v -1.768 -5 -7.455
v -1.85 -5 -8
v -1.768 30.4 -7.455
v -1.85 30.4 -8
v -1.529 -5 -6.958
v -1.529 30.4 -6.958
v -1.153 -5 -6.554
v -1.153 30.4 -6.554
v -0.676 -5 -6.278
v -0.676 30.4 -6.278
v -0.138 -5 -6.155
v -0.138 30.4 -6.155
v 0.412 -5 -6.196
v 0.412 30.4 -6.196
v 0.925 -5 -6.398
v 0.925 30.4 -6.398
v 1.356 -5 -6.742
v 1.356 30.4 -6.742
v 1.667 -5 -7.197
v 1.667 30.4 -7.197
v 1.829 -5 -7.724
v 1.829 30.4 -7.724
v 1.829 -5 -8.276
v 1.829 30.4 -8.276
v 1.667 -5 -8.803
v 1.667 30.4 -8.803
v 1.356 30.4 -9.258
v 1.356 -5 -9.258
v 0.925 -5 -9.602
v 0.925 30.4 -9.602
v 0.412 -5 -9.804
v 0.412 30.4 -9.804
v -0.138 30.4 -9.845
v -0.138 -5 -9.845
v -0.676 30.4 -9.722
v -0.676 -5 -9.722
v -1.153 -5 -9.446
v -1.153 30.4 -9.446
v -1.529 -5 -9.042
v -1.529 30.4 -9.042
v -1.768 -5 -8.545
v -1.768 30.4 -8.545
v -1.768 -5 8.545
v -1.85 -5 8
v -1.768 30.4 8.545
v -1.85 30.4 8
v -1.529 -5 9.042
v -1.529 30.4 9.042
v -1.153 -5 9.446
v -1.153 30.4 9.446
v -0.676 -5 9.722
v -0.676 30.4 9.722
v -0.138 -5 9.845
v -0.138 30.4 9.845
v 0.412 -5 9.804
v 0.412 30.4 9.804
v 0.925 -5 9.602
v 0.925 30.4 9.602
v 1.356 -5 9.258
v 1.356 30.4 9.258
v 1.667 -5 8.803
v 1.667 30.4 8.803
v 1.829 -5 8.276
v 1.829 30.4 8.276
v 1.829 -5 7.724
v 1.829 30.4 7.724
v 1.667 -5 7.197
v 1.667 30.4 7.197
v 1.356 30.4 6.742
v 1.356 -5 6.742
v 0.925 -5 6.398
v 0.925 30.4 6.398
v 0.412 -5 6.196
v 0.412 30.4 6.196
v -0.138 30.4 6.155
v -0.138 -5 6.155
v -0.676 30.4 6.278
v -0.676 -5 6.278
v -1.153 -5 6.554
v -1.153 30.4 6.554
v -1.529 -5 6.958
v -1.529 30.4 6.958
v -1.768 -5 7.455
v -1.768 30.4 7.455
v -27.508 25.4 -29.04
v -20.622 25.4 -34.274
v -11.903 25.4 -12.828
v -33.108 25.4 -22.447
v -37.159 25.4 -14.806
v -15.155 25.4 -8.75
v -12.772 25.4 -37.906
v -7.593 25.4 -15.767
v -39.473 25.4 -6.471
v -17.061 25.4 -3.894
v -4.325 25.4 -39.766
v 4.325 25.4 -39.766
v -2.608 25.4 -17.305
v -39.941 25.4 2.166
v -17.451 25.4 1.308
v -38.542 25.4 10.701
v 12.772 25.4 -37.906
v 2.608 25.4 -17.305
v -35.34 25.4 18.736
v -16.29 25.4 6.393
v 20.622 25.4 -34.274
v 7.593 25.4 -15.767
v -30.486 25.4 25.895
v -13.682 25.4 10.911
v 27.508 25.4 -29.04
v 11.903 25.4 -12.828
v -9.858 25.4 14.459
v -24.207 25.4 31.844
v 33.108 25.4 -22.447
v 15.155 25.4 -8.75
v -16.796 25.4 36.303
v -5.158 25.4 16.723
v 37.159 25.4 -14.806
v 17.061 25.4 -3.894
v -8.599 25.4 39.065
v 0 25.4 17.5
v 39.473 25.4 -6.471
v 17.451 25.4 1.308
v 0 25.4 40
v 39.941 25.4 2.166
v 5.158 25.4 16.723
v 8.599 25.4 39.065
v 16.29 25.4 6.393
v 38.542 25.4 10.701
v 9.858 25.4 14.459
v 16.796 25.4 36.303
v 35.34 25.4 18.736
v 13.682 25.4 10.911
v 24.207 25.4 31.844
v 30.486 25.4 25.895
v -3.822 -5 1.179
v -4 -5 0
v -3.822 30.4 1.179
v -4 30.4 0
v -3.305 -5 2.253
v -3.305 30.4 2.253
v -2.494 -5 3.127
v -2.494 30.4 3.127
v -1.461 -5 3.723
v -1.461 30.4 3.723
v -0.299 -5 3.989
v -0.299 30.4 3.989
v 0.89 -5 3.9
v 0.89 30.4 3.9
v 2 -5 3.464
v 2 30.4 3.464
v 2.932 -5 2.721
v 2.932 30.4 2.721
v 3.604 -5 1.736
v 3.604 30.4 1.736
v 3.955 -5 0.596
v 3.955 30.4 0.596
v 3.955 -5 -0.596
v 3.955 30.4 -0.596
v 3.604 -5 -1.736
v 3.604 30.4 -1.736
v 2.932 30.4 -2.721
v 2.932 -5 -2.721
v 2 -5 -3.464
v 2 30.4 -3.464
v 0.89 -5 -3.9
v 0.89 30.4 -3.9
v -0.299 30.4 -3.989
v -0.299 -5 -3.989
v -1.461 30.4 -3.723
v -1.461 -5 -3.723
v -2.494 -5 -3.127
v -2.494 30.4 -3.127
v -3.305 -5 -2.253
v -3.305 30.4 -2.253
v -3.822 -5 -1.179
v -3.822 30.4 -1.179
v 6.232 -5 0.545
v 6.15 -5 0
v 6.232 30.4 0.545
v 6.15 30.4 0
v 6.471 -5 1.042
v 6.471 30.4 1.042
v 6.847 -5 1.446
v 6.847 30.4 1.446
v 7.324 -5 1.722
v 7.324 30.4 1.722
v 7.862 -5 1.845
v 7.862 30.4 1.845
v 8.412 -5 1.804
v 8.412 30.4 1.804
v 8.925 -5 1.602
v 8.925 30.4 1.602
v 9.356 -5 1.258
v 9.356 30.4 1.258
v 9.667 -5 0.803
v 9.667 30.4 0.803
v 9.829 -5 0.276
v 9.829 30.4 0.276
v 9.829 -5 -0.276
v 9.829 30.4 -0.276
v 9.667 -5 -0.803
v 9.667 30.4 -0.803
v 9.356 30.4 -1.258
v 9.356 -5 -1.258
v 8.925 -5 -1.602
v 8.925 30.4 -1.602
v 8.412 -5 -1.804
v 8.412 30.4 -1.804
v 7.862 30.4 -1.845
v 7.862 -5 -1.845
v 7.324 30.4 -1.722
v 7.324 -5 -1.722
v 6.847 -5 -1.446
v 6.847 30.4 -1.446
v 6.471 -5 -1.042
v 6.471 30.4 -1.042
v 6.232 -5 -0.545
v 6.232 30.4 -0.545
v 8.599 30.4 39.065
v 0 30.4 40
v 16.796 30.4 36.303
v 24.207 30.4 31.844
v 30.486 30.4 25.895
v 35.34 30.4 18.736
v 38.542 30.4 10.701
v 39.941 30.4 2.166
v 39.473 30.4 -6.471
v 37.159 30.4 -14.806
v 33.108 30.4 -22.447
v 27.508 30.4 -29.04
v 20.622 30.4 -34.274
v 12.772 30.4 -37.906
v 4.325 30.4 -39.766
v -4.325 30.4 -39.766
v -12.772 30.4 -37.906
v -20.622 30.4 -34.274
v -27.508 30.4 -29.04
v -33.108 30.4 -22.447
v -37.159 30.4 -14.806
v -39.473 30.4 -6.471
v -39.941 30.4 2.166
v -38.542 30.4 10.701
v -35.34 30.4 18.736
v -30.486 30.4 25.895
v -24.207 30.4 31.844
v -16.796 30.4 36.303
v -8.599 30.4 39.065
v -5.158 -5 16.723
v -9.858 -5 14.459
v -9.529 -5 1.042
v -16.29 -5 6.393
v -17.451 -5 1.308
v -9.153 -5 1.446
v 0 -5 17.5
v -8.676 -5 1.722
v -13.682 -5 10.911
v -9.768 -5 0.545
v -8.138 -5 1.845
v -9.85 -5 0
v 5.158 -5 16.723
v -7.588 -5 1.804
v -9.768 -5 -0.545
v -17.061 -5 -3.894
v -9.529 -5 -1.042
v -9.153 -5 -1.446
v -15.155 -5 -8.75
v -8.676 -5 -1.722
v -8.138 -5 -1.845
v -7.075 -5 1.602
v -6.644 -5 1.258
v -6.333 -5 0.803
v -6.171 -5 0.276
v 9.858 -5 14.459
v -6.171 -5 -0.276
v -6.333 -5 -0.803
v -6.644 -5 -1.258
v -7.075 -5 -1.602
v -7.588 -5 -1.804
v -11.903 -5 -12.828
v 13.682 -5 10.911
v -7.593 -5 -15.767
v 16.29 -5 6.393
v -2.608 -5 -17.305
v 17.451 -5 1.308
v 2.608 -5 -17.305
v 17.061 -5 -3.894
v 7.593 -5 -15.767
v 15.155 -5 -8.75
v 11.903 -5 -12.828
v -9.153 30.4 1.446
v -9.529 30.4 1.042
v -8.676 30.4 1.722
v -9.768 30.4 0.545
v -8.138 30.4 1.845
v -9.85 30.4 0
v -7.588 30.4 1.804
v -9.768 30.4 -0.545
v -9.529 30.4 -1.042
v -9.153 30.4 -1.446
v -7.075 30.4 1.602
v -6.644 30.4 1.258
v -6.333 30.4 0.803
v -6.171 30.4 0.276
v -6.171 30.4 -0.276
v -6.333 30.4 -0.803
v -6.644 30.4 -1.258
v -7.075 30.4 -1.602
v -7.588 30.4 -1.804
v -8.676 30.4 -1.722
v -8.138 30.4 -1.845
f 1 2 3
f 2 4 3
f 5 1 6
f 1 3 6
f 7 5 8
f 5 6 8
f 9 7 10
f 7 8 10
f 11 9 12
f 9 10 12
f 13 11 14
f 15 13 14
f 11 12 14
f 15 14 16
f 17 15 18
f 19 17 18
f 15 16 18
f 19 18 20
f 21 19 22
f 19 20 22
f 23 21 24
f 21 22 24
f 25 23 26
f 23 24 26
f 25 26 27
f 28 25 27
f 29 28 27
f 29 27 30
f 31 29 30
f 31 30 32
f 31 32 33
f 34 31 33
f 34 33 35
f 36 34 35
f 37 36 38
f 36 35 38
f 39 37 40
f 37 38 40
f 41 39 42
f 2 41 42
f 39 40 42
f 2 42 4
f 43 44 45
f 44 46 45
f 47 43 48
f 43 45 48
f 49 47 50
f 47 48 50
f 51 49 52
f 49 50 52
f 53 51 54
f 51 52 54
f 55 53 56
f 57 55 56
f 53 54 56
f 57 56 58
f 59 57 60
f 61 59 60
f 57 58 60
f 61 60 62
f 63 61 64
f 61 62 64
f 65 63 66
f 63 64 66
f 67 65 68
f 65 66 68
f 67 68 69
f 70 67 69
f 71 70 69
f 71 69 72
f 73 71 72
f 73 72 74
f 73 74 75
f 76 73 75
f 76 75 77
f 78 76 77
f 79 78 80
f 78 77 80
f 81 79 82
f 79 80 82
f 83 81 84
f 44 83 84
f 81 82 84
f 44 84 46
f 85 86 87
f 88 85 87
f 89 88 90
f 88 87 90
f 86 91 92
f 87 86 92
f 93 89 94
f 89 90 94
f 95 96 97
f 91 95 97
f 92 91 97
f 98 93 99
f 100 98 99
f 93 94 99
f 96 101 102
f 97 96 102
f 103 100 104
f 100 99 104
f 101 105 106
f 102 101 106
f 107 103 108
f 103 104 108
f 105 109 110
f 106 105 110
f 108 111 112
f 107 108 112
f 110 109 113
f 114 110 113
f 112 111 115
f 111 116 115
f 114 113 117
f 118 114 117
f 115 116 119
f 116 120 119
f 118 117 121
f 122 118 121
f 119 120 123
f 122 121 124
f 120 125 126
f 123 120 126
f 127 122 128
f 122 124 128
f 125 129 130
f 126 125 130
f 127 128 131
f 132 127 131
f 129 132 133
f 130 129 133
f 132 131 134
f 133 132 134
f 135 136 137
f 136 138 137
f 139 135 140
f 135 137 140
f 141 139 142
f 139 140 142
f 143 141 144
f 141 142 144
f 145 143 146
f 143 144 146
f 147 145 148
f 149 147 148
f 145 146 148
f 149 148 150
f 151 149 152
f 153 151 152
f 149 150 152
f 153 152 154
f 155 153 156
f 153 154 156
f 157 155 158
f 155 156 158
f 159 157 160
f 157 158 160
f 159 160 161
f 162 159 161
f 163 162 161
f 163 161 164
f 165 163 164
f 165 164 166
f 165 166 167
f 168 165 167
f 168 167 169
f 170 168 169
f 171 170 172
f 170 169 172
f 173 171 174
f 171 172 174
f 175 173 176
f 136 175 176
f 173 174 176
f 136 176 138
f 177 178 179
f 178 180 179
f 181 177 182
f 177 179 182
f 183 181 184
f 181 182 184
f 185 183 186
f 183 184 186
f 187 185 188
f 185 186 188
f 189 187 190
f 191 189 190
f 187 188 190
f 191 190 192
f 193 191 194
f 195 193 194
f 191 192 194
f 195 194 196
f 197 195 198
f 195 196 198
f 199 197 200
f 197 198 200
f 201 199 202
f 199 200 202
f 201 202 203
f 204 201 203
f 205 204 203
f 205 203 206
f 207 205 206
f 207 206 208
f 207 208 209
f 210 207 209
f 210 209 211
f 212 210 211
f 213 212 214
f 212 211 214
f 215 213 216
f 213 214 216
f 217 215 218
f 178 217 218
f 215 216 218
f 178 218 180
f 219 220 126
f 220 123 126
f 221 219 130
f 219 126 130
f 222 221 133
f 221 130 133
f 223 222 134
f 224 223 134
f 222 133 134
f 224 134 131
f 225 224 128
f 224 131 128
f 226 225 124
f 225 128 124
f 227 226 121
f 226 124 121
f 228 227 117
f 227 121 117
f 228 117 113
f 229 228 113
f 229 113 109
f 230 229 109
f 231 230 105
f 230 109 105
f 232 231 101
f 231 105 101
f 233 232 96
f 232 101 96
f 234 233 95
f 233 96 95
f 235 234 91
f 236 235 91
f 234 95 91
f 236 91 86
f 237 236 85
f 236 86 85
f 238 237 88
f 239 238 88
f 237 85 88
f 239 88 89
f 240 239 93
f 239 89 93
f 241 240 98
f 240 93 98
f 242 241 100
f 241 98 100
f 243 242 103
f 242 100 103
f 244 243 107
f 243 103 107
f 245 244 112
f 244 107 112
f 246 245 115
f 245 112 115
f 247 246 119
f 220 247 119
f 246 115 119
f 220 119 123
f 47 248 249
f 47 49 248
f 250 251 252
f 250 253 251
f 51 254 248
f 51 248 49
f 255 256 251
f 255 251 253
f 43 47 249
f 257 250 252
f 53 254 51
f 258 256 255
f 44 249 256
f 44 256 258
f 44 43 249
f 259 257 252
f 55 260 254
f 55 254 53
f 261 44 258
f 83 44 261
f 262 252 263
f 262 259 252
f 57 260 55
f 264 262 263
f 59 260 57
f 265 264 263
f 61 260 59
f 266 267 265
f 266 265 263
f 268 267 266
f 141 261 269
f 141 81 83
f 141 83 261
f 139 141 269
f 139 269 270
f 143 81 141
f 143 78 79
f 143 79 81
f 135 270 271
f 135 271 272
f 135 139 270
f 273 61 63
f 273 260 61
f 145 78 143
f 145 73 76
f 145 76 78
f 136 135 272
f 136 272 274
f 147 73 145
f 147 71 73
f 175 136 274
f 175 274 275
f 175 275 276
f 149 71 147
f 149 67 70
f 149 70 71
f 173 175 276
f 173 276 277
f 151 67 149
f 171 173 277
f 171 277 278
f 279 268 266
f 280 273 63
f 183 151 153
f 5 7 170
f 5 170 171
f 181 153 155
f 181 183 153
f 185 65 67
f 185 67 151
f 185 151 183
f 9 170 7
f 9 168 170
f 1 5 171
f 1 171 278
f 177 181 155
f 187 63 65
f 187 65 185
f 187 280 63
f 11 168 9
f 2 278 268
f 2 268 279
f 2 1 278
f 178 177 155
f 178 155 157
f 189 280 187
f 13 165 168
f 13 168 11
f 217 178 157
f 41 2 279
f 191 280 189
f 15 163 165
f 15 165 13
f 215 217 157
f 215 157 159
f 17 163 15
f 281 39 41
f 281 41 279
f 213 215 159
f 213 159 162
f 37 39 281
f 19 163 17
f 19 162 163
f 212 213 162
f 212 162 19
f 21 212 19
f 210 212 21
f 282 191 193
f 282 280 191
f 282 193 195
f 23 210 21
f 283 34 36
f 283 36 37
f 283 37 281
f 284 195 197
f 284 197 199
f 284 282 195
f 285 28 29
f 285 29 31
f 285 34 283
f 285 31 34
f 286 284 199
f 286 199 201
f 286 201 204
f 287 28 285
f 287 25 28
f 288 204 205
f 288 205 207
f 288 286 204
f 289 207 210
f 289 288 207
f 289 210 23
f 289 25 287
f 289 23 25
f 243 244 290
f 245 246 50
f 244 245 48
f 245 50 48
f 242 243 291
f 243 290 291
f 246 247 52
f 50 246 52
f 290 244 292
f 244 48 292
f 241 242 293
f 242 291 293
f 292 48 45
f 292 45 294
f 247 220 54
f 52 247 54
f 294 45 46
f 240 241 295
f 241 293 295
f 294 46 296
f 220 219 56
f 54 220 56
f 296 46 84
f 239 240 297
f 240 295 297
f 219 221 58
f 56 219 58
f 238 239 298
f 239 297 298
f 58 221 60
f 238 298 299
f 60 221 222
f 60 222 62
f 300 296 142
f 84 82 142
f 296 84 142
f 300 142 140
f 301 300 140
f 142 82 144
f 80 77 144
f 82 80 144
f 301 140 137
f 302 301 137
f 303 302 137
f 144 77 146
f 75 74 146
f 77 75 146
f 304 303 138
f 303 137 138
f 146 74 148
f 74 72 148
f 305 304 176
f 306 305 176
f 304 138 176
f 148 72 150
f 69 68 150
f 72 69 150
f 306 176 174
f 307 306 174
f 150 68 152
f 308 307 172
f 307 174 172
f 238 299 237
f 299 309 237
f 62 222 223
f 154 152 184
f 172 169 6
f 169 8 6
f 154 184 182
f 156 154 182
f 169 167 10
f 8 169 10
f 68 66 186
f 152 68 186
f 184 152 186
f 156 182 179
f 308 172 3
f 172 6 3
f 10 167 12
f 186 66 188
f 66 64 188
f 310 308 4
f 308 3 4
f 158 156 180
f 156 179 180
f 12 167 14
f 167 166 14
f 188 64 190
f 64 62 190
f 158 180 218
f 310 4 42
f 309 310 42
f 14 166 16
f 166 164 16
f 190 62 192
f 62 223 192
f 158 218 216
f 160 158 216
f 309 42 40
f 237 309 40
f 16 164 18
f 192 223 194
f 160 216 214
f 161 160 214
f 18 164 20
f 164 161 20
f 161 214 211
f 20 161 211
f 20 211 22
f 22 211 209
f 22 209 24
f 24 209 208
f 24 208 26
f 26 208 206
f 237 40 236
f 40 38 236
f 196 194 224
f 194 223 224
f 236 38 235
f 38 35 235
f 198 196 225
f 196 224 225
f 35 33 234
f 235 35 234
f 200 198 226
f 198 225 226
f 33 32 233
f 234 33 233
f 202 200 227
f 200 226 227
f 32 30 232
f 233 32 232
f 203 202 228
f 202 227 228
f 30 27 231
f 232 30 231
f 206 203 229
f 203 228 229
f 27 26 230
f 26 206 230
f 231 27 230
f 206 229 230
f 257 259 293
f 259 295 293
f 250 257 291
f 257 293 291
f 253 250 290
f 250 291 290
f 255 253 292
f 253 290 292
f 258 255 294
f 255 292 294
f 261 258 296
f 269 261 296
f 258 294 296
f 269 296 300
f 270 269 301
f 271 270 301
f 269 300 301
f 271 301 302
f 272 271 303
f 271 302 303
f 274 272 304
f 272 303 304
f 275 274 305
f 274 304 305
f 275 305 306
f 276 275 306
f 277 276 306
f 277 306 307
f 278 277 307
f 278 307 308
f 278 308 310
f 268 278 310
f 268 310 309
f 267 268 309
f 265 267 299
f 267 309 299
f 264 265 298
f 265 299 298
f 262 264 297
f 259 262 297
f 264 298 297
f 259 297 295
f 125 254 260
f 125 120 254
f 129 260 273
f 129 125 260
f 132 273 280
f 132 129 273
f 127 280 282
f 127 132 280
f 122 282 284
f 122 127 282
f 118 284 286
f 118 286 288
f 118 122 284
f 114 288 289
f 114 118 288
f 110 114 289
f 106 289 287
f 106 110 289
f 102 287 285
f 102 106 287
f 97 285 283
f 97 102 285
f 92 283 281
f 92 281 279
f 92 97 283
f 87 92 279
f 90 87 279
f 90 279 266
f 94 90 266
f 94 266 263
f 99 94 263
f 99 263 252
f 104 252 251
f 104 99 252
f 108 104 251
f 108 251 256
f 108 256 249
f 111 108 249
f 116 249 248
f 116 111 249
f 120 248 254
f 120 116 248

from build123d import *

# Parameters (mm, degrees)
F0_W     = 25.4
F0_H     = 17.5
F2_R     = 1.85
F2_R_2   = 4
F3_DEPTH = 40
F4_DEPTH = 5


# Not quite as in the source:
# - a feature names something its author has since deleted; it is built from what else it names


with BuildPart() as f1:
    # F0 (on Right) → F1 (revolve)
    with BuildSketch(Plane.YZ):
        with Locations((12.7, 8.75)):
            Rectangle(F0_W, F0_H)
        Polygon((25.4, 17.5), (25.4, 0), (30.4, 0), (30.4, 40), (25.4, 40), align=None)
    revolve(axis=Axis((0, 12.7, 0), (0, 1, 0)))

    # F2 (on face) → F3 (cut)
    with BuildSketch(Plane(origin=(0, 30.4, 0), x_dir=(-1, 0, 0), z_dir=(0, 1, 0))):
        with Locations((0, 8)):
            Circle(F2_R)
        with Locations((-8, 0)):
            Circle(F2_R)
        Circle(F2_R_2)
        with Locations((0, -8)):
            Circle(F2_R)
        with Locations((8, 0)):
            Circle(F2_R)
    extrude(amount=-F3_DEPTH, mode=Mode.SUBTRACT)

    # F4 (add): a face of the model
    f4_faces = [f1.faces().sort_by_distance(p)[0] for p in [
        (0, 0, -17.0050252532),
    ]]
    extrude(f4_faces, amount=F4_DEPTH)


solid = f1.part
